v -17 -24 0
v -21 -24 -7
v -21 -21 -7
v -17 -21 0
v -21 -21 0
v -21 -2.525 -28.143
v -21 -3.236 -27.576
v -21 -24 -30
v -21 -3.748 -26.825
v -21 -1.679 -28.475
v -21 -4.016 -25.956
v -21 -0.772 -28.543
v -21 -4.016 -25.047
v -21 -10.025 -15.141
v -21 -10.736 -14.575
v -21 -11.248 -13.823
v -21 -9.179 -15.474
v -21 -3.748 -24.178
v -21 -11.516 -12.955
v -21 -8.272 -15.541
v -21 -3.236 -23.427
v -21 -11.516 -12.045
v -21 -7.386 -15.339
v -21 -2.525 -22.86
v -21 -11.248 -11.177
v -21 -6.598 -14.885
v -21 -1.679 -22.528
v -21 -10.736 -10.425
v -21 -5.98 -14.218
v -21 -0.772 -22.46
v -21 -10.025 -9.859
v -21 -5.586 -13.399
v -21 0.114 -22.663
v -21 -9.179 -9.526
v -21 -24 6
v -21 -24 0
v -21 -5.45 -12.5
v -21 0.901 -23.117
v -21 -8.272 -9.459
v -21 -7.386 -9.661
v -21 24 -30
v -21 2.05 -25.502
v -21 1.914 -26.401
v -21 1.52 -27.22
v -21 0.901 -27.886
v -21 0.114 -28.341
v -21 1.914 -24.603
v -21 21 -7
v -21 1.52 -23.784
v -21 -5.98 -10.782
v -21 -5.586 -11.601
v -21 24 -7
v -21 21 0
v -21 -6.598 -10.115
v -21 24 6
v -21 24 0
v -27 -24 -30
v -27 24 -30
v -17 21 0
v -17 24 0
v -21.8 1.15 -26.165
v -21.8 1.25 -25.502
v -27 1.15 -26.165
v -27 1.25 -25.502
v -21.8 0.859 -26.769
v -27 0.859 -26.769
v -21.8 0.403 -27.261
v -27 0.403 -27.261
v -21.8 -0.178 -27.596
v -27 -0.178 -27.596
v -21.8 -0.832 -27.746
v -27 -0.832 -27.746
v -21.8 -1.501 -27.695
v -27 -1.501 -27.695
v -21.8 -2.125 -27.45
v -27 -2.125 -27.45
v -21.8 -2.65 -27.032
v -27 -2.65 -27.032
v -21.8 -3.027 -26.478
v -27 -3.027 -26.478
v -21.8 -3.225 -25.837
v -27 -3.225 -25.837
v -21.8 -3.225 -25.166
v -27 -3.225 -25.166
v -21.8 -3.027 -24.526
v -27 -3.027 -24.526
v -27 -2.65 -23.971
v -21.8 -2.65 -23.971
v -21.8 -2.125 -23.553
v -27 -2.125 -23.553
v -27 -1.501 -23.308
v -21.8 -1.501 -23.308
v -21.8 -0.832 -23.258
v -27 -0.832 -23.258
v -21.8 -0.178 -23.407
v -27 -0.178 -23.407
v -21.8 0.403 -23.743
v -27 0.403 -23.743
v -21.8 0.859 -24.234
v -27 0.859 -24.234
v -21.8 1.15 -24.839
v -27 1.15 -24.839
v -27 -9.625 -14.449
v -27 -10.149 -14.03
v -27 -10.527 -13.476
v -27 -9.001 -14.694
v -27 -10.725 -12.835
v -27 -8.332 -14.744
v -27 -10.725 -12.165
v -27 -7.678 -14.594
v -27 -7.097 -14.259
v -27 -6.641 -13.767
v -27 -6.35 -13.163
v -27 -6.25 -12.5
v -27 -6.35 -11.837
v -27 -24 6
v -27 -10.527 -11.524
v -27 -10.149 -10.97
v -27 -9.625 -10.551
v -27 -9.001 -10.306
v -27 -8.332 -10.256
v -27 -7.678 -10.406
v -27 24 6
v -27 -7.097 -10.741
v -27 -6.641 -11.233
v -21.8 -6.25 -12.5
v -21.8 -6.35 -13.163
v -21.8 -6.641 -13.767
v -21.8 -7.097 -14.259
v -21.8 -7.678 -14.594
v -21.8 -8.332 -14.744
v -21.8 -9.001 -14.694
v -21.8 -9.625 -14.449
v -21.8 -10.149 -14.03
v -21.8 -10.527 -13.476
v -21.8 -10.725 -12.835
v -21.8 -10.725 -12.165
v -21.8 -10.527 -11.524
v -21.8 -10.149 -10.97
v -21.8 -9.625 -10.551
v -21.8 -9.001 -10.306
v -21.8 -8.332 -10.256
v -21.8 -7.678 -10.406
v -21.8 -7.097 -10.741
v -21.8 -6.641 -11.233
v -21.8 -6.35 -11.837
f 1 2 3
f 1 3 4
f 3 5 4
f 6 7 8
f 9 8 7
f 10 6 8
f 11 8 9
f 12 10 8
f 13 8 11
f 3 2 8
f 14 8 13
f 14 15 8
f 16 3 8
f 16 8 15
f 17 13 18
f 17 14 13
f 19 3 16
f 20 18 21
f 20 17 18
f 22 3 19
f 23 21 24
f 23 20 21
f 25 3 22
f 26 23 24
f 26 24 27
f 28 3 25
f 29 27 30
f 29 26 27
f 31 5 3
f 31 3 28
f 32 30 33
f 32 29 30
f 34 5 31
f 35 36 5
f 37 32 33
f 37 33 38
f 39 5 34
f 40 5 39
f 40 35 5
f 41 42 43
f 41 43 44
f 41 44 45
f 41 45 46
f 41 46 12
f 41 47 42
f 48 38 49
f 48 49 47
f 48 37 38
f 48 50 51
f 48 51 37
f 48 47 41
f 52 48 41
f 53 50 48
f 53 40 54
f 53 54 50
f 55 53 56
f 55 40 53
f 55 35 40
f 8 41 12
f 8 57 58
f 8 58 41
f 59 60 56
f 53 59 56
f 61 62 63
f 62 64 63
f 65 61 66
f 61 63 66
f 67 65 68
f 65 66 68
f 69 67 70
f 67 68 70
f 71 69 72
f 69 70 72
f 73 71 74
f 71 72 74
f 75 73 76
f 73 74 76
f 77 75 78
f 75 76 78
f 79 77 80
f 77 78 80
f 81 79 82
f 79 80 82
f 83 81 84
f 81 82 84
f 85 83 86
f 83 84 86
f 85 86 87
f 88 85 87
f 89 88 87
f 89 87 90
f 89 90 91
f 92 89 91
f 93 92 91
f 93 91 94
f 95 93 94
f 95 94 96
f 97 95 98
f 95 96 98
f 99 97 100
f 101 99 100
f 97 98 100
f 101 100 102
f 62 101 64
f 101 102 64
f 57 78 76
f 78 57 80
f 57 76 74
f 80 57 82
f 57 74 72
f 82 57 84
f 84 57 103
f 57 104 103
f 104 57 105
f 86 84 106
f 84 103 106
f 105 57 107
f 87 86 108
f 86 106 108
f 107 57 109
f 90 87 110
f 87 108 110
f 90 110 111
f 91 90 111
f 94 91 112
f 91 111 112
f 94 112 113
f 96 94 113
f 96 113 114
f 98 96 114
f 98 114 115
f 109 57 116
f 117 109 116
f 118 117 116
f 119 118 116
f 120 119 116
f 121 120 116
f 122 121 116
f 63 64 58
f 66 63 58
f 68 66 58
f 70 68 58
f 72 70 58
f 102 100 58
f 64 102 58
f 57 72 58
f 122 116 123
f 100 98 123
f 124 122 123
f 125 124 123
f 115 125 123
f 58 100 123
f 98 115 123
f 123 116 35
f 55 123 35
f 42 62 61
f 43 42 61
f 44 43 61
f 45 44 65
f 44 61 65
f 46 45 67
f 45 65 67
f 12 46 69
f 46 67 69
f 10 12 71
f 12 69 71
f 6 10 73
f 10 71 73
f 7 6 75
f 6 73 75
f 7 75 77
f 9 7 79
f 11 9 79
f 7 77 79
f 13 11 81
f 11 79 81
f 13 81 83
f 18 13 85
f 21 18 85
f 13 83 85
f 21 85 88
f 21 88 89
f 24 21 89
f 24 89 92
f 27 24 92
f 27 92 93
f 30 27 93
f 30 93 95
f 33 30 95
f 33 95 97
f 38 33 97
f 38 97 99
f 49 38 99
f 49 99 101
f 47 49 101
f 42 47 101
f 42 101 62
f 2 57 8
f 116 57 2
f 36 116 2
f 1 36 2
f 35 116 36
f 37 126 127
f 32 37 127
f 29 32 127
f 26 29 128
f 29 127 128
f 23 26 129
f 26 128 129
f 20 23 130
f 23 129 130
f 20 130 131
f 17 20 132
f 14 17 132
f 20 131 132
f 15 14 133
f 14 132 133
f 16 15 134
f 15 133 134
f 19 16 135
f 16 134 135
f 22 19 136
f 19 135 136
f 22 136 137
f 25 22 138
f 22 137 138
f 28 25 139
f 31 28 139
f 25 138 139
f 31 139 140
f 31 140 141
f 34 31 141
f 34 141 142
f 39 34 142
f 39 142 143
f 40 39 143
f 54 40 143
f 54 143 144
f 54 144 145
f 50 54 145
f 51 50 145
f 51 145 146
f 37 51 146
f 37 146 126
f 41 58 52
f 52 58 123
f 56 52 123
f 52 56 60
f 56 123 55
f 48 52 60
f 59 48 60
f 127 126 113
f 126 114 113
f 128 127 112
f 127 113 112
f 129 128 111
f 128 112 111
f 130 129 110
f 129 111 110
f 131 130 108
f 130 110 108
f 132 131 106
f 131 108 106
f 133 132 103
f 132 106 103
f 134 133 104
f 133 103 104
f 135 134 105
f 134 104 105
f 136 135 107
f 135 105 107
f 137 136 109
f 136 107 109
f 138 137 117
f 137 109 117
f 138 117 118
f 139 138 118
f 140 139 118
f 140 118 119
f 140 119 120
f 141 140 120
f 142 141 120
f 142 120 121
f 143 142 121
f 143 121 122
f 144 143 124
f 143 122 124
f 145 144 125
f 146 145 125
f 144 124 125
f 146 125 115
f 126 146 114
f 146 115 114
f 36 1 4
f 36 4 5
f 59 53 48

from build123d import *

# Parameters (mm, degrees)
SKETCH002_W         = 6
SKETCH002_H         = 48
PAD001_DEPTH        = 6
PAD001_DEPTH_BACK   = 30
PAD002_DEPTH        = 3
HOLE004_D           = 4.5
HOLE004_DEPTH       = 25
HOLE004_CSINK_D     = 6.1
HOLE004_CSINK_ANGLE = 90


with BuildPart() as part:
    # Sketch002 (on Face1 of Binder001) → Pad001 (new body, two sides)
    with BuildSketch(Plane.XY) as pad001_sk:
        with Locations((-24, 0)):
            Rectangle(SKETCH002_W, SKETCH002_H)
    extrude(amount=PAD001_DEPTH)
    extrude(pad001_sk.sketch, amount=-PAD001_DEPTH_BACK)

    # Sketch003 (on Face3 of Pad001) → Pad002 (join)
    with BuildSketch(Plane.XZ.offset(24)):
        Polygon((-21, 0), (-21, -7), (-17, 0), align=None)
    pad002 = extrude(amount=-PAD002_DEPTH)

    # Mirrored: Pad002 across XZ
    add(pad002.mirror(Plane.XZ))

    # Hole004
    with Locations(Plane(origin=(-21, -191, 0), x_dir=(0, -1, 0), z_dir=(1, 0, 0))):
        with Locations((-189.999737, 25.501831), (-182.5, 12.5)):
            CounterSinkHole(HOLE004_D / 2, HOLE004_CSINK_D / 2, depth=HOLE004_DEPTH, counter_sink_angle=HOLE004_CSINK_ANGLE)


solid = part.part
